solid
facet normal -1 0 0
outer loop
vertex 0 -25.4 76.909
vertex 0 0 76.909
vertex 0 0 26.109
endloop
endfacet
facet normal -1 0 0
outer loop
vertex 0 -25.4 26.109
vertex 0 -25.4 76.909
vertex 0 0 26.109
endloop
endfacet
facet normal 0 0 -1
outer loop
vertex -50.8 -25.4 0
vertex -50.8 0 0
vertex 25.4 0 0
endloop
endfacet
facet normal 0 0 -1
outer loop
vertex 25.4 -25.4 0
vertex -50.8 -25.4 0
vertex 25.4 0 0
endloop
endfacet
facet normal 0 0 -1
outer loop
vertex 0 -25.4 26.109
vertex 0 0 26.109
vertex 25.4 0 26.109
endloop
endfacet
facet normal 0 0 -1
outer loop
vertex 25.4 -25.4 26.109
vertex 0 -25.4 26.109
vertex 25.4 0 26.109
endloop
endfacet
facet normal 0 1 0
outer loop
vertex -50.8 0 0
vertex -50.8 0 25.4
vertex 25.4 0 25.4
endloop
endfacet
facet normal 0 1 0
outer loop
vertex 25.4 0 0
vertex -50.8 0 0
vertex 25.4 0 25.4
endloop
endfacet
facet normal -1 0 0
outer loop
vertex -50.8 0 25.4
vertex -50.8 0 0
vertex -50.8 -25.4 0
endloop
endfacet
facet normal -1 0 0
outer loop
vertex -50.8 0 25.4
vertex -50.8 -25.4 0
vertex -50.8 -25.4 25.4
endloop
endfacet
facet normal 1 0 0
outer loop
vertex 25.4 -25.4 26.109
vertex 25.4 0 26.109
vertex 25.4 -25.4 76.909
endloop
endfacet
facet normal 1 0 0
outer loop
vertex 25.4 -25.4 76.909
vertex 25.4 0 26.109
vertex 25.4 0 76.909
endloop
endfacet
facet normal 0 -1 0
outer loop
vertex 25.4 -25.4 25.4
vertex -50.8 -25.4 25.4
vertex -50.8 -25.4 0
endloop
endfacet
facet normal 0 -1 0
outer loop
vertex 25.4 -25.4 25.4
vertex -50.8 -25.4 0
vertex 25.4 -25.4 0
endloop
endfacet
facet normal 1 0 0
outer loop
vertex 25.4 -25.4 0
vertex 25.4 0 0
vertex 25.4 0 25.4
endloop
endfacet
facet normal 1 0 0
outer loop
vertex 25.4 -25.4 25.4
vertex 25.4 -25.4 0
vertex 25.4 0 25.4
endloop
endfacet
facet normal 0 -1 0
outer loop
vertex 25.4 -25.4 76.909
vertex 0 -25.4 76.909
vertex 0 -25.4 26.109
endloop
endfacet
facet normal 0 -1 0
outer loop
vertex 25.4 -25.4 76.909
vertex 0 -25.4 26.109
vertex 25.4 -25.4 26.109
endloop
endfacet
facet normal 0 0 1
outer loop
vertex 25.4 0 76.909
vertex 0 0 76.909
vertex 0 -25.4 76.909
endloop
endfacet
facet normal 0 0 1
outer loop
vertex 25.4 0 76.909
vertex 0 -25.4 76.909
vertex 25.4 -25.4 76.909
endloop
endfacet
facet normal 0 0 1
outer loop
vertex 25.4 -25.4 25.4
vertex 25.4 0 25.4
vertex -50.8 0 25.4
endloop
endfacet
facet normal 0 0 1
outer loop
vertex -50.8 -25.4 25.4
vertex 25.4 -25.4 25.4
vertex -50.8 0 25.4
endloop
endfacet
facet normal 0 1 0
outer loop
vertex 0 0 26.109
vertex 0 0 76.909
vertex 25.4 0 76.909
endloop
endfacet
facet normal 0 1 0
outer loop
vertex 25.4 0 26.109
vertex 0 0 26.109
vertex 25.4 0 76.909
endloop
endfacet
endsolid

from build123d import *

# Parameters (mm, degrees)
F1_W     = 25.4
F1_H     = 25.4
F0_W     = 25.4
F0_H     = 25.4
F2_DEPTH = 25.4


with BuildPart() as f2:
    # F1 (on Front) + F0 (on Front) → F2 (new body)
    with BuildSketch(Plane.XZ):
        with Locations((12.7, 64.209499)):
            Rectangle(F1_W, F1_H)
        with Locations((12.7, 38.809499)):
            Rectangle(F1_W, F1_H)
    with BuildSketch(Plane.XZ):
        with Locations((12.7, 12.7)):
            Rectangle(F0_W, F0_H)
        with Locations((-12.7, 12.7)):
            Rectangle(F0_W, F0_H)
        with Locations((-38.1, 12.7)):
            Rectangle(F0_W, F0_H)
    extrude(amount=F2_DEPTH)


solid = f2.part
